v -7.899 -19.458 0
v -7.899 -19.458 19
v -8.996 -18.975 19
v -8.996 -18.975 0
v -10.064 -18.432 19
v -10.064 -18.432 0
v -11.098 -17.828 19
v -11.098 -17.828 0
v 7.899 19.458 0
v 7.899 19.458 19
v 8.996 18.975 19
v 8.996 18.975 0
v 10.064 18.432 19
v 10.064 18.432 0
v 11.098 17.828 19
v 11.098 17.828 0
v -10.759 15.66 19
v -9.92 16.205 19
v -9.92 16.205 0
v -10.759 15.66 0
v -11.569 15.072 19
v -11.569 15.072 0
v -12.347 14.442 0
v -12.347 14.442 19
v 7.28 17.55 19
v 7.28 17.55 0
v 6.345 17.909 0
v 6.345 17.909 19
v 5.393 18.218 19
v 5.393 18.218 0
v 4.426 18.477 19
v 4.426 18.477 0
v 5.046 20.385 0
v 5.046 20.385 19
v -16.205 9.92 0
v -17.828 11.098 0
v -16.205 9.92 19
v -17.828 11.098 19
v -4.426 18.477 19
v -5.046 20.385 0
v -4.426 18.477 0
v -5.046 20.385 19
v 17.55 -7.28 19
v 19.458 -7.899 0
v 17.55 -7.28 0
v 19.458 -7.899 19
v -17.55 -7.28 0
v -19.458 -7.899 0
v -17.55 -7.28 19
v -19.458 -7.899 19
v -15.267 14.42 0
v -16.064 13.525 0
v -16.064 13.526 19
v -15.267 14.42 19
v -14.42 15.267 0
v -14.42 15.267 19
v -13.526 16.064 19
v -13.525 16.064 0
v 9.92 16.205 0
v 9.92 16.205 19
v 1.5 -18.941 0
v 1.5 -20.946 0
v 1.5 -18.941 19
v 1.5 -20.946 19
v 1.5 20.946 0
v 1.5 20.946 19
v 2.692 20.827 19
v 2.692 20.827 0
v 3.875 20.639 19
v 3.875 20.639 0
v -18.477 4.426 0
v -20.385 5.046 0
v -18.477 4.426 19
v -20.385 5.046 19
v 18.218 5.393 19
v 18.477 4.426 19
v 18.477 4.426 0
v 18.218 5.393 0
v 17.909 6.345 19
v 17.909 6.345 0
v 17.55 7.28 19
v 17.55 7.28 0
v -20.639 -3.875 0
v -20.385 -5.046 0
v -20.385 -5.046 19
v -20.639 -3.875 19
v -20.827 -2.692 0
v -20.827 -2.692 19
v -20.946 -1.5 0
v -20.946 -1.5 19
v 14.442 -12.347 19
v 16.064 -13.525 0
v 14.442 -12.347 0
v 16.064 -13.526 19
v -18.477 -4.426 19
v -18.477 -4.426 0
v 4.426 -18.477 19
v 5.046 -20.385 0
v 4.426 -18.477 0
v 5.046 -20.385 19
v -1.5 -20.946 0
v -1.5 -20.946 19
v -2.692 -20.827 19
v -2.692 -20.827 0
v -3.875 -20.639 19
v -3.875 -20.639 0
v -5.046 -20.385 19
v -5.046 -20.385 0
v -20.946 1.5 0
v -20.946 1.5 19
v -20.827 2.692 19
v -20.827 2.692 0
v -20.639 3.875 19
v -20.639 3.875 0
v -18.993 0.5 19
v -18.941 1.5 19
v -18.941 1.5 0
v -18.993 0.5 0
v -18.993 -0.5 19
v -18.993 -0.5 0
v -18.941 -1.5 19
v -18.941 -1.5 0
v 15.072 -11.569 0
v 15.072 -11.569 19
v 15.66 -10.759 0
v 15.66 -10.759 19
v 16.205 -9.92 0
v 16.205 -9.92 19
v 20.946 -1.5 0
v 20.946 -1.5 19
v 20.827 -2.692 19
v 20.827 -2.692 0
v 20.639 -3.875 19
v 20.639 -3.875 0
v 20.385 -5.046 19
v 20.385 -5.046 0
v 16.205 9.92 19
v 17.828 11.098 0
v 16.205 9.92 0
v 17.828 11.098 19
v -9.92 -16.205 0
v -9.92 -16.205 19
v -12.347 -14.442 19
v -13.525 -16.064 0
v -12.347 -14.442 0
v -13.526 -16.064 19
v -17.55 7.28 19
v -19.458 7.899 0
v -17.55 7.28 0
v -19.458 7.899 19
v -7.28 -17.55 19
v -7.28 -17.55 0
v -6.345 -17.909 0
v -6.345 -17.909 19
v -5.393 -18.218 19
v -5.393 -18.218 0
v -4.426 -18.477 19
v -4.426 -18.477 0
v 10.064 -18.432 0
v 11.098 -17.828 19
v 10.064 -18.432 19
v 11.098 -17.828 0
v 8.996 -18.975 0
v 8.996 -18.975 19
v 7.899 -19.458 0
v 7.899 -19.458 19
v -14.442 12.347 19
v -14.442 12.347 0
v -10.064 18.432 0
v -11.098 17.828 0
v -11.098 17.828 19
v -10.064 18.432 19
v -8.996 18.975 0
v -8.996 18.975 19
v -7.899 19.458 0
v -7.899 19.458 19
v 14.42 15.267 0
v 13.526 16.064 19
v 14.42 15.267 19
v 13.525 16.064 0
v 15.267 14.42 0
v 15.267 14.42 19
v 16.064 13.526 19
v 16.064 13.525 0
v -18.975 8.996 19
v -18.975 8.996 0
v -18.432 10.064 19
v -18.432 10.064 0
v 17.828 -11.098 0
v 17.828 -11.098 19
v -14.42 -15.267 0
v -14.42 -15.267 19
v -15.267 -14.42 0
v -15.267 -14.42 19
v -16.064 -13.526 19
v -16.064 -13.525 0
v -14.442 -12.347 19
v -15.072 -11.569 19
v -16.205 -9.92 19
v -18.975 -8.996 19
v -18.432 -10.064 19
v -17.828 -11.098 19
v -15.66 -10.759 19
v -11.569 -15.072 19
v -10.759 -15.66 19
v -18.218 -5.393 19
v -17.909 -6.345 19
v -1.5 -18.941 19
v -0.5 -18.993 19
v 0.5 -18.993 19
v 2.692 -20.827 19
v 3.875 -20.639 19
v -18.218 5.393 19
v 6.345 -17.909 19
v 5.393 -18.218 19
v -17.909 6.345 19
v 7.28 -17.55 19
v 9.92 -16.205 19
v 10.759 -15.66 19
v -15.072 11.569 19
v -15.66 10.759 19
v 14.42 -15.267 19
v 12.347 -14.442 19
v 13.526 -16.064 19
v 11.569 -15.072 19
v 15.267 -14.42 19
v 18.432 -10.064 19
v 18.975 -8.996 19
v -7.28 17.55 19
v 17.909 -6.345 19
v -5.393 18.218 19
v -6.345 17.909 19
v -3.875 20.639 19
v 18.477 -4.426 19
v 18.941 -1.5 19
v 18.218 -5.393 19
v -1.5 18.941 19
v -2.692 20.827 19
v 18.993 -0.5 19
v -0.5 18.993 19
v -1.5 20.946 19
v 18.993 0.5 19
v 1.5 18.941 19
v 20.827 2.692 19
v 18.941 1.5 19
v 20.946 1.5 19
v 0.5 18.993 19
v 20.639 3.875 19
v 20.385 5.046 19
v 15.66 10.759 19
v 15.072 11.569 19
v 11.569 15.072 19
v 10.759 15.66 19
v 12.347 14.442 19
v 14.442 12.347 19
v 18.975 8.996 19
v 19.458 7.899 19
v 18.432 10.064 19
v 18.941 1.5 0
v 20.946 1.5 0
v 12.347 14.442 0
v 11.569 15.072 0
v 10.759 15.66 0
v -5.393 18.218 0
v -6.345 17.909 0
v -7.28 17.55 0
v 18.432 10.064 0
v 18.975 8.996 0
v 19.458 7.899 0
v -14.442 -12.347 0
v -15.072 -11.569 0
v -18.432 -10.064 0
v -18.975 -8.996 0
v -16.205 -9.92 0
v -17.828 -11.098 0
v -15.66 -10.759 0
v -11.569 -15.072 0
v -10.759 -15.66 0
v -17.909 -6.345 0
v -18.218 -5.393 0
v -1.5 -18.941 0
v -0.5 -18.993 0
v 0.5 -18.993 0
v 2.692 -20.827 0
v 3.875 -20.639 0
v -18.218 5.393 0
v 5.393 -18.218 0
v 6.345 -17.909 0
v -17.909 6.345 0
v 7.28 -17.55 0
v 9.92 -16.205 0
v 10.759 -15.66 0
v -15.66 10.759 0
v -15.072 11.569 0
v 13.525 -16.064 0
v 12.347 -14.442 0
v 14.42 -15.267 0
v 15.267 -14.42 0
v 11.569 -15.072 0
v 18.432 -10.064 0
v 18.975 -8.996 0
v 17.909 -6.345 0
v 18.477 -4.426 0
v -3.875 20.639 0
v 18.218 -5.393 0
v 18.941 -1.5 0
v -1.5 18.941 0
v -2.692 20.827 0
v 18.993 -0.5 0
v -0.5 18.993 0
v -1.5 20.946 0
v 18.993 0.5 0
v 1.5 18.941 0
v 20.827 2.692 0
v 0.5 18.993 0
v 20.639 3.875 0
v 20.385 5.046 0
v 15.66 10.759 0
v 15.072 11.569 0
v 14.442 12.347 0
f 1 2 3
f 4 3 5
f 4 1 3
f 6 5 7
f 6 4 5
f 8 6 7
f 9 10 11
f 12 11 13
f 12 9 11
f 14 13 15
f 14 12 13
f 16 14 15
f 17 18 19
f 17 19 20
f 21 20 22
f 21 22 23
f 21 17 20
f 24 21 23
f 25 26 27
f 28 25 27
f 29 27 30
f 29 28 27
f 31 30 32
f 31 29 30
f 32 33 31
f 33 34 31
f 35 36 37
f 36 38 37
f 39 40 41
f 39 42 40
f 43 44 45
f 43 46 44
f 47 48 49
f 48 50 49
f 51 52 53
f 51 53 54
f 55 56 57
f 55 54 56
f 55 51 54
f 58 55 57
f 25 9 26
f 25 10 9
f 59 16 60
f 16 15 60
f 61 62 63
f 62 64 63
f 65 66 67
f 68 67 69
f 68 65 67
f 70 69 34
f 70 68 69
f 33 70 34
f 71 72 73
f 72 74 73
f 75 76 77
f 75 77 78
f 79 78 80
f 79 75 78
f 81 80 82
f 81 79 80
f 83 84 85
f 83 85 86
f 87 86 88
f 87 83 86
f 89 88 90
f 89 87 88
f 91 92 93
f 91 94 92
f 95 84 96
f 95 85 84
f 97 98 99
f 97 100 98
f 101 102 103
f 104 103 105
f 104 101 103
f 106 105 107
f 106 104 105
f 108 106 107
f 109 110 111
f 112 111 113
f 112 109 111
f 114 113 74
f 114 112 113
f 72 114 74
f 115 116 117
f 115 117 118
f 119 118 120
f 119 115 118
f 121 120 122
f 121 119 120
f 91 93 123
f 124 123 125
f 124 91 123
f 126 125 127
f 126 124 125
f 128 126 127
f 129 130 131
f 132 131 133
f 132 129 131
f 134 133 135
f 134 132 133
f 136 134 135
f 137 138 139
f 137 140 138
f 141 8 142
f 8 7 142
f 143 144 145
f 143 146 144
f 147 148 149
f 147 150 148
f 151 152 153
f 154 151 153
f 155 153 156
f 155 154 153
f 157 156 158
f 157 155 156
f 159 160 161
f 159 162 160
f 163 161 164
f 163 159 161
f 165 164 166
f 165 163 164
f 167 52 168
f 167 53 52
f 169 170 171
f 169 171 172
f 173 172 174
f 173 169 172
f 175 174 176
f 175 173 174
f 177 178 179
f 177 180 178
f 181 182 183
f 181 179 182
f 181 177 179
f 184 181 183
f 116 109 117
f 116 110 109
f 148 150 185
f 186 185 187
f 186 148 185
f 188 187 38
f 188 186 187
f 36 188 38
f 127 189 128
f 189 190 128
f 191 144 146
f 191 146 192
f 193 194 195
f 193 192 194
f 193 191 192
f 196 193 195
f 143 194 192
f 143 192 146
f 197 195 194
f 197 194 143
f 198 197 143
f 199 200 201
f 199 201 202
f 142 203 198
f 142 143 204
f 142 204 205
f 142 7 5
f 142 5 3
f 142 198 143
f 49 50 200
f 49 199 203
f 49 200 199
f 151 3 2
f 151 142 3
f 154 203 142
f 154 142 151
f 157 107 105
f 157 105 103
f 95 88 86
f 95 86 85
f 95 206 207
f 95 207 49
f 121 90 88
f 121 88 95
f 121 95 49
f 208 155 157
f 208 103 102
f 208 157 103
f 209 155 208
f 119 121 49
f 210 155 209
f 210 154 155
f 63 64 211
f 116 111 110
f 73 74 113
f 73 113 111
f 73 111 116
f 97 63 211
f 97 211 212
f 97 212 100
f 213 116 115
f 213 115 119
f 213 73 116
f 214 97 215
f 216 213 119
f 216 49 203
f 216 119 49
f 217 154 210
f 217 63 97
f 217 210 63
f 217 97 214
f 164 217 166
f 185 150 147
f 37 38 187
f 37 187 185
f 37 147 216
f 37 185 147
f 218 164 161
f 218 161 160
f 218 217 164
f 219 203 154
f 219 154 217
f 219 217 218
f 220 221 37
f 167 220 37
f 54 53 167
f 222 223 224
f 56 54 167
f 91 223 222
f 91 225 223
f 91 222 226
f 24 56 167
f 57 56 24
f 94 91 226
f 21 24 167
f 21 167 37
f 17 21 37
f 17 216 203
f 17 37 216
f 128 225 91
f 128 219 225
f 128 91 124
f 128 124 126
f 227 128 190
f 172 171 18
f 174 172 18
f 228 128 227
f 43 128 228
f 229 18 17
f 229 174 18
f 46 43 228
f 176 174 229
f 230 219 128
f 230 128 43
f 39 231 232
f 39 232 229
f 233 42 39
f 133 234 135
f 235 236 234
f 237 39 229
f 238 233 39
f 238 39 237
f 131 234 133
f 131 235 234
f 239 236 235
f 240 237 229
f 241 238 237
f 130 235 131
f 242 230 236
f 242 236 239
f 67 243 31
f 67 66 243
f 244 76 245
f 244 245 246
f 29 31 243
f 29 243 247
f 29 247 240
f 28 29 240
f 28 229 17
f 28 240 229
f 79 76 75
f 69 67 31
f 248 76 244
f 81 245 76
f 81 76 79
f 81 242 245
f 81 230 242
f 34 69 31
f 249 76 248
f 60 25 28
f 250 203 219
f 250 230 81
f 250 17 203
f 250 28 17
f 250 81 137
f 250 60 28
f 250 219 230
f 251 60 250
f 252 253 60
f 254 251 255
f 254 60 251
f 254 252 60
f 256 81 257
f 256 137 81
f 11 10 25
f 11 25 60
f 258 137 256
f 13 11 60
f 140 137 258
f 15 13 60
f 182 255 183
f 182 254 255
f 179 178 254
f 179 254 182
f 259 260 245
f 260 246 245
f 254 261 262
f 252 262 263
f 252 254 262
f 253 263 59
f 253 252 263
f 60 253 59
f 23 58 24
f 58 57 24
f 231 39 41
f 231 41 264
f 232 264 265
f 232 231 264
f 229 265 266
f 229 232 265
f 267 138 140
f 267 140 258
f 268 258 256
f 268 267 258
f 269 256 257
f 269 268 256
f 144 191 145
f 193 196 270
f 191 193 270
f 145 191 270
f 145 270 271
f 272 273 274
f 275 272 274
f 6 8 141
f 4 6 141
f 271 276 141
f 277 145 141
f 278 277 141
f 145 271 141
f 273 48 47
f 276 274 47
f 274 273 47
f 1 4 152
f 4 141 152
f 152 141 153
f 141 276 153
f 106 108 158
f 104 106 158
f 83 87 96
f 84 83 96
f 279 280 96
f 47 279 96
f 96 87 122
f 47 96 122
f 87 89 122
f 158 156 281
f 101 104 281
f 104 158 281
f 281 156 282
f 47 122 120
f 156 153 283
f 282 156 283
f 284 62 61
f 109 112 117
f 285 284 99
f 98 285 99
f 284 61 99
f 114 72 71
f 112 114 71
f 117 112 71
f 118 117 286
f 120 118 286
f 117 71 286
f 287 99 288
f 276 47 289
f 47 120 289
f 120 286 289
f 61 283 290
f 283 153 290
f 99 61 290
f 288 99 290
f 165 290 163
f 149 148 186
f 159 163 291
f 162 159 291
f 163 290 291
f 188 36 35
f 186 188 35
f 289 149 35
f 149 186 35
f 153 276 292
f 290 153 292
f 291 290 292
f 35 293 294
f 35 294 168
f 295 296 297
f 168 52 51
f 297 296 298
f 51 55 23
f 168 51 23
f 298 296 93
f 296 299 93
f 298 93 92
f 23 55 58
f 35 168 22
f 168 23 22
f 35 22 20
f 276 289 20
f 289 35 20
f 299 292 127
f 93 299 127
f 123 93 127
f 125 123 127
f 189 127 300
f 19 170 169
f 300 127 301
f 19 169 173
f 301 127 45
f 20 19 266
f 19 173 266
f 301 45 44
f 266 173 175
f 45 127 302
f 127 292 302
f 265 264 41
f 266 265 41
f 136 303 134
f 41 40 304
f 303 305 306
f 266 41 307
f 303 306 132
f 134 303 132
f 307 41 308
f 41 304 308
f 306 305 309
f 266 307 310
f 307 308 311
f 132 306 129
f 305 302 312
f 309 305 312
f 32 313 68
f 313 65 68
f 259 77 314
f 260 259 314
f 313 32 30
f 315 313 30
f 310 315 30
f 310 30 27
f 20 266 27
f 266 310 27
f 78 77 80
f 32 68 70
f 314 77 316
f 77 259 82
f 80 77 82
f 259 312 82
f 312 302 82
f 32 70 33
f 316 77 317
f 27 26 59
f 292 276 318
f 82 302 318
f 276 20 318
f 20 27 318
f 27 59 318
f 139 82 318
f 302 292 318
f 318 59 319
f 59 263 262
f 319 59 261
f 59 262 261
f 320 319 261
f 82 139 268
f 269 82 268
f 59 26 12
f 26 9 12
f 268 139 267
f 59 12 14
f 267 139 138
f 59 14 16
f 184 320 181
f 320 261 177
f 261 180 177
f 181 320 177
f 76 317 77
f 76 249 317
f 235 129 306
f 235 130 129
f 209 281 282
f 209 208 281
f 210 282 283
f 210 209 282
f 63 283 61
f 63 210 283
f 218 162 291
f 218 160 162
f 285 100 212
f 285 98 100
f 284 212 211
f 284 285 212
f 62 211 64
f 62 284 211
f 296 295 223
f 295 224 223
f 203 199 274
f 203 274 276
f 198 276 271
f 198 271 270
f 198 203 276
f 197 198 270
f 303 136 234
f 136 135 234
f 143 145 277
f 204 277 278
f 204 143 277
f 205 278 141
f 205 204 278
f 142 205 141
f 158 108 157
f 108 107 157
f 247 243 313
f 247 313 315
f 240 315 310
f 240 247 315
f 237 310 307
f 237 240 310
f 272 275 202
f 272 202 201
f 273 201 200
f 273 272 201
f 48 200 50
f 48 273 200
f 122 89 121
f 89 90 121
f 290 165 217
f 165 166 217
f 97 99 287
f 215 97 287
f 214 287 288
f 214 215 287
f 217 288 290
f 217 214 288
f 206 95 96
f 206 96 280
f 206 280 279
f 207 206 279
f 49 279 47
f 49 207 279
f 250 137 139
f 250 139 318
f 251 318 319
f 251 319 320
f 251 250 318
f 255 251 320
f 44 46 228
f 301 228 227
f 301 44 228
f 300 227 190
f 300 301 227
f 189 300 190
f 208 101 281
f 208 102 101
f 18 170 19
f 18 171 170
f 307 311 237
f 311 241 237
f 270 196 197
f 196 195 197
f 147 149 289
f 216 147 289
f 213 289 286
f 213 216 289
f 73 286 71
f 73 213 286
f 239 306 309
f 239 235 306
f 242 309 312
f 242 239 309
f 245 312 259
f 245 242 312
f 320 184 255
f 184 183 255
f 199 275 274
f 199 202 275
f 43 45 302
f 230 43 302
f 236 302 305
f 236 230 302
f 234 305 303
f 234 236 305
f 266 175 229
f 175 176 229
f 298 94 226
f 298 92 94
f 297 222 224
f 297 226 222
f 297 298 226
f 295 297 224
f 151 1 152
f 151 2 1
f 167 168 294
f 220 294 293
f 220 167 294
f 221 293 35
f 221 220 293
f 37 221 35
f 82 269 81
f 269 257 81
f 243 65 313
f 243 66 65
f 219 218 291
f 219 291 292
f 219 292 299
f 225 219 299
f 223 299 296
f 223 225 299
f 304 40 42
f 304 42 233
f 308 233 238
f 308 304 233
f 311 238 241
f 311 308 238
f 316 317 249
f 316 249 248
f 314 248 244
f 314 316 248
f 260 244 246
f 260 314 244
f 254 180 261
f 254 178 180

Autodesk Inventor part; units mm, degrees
ref_plane "YZ Plane" through (0, 0, 0) normal (1, 0, 0) x (0, 1, 0)
ref_plane "XZ Plane" through (0, 0, 0) normal (0, 1, 0) x (-1, 0, 0)
ref_plane "XY Plane" through (0, 0, 0) normal (0, 0, 1) x (1, 0, 0)
sketch "Boceto1" plane through (0, 0, 0) normal (0, 0, 1) x (1, 0, 0)
  circle A0 centre (0, 0) radius 21
  dimension "d0" = 42
extrude "Extrusión1" add sketch "Boceto1" along normal blind 19
sketch "Boceto2" plane through (0, 0, 19) normal (0, 0, 1) x (1, 0, 0)
  circle A0 centre (0, 0) radius 21 construction
  circle A1 centre (0, 0) radius 21 projected
  circle A2 centre (0, 0) radius 19 construction
  arc A3 (1.5, 20.9464) -> (-1.5, 20.9464) centre (0, 0) ccw
  line L0 (1.5, 20.9464) -> (1.5, 18.9407)
  line L1 (-1.5, 20.9464) -> (-1.5, 18.9407)
  arc A4 (1.5, 18.9407) -> (-1.5, 18.9407) centre (0, 0) ccw
  arc A5 (7.8994, 19.4576) -> (5.0462, 20.3847) centre (0, 0) ccw
  line L2 (7.8994, 19.4576) -> (7.2796, 17.5501)
  line L3 (5.0462, 20.3847) -> (4.4264, 18.4772)
  arc A6 (7.2796, 17.5501) -> (4.4264, 18.4772) centre (0, 0) ccw
  arc A7 (13.5255, 16.0643) -> (11.0984, 17.8276) centre (0, 0) ccw
  line L4 (13.5255, 16.0643) -> (12.3466, 14.4417)
  line L5 (11.0984, 17.8276) -> (9.9195, 16.205)
  arc A8 (12.3466, 14.4417) -> (9.9195, 16.205) centre (0, 0) ccw
  arc A9 (17.8276, 11.0984) -> (16.0643, 13.5255) centre (0, 0) ccw
  line L6 (17.8276, 11.0984) -> (16.205, 9.9195)
  line L7 (16.0643, 13.5255) -> (14.4417, 12.3466)
  arc A10 (16.205, 9.9195) -> (14.4417, 12.3466) centre (0, 0) ccw
  arc A11 (20.3847, 5.0462) -> (19.4576, 7.8994) centre (0, 0) ccw
  line L8 (20.3847, 5.0462) -> (18.4772, 4.4264)
  line L9 (19.4576, 7.8994) -> (17.5501, 7.2796)
  arc A12 (18.4772, 4.4264) -> (17.5501, 7.2796) centre (0, 0) ccw
  arc A13 (20.9464, -1.5) -> (20.9464, 1.5) centre (0, 0) ccw
  line L10 (20.9464, -1.5) -> (18.9407, -1.5)
  line L11 (20.9464, 1.5) -> (18.9407, 1.5)
  arc A14 (18.9407, -1.5) -> (18.9407, 1.5) centre (0, 0) ccw
  arc A15 (19.4576, -7.8994) -> (20.3847, -5.0462) centre (0, 0) ccw
  line L12 (19.4576, -7.8994) -> (17.5501, -7.2796)
  line L13 (20.3847, -5.0462) -> (18.4772, -4.4264)
  arc A16 (17.5501, -7.2796) -> (18.4772, -4.4264) centre (0, 0) ccw
  arc A17 (16.0643, -13.5255) -> (17.8276, -11.0984) centre (0, 0) ccw
  line L14 (16.0643, -13.5255) -> (14.4417, -12.3466)
  line L15 (17.8276, -11.0984) -> (16.205, -9.9195)
  arc A18 (14.4417, -12.3466) -> (16.205, -9.9195) centre (0, 0) ccw
  arc A19 (11.0984, -17.8276) -> (13.5255, -16.0643) centre (0, 0) ccw
  line L16 (11.0984, -17.8276) -> (9.9195, -16.205)
  line L17 (13.5255, -16.0643) -> (12.3466, -14.4417)
  arc A20 (9.9195, -16.205) -> (12.3466, -14.4417) centre (0, 0) ccw
  arc A21 (5.0462, -20.3847) -> (7.8994, -19.4576) centre (0, 0) ccw
  line L18 (5.0462, -20.3847) -> (4.4264, -18.4772)
  line L19 (7.8994, -19.4576) -> (7.2796, -17.5501)
  arc A22 (4.4264, -18.4772) -> (7.2796, -17.5501) centre (0, 0) ccw
  arc A23 (-1.5, -20.9464) -> (1.5, -20.9464) centre (0, 0) ccw
  line L20 (-1.5, -20.9464) -> (-1.5, -18.9407)
  line L21 (1.5, -20.9464) -> (1.5, -18.9407)
  arc A24 (-1.5, -18.9407) -> (1.5, -18.9407) centre (0, 0) ccw
  arc A25 (-7.8994, -19.4576) -> (-5.0462, -20.3847) centre (0, 0) ccw
  line L22 (-7.8994, -19.4576) -> (-7.2796, -17.5501)
  line L23 (-5.0462, -20.3847) -> (-4.4264, -18.4772)
  arc A26 (-7.2796, -17.5501) -> (-4.4264, -18.4772) centre (0, 0) ccw
  arc A27 (-13.5255, -16.0643) -> (-11.0984, -17.8276) centre (0, 0) ccw
  line L24 (-13.5255, -16.0643) -> (-12.3466, -14.4417)
  line L25 (-11.0984, -17.8276) -> (-9.9195, -16.205)
  arc A28 (-12.3466, -14.4417) -> (-9.9195, -16.205) centre (0, 0) ccw
  arc A29 (-17.8276, -11.0984) -> (-16.0643, -13.5255) centre (0, 0) ccw
  line L26 (-17.8276, -11.0984) -> (-16.205, -9.9195)
  line L27 (-16.0643, -13.5255) -> (-14.4417, -12.3466)
  arc A30 (-16.205, -9.9195) -> (-14.4417, -12.3466) centre (0, 0) ccw
  arc A31 (-20.3847, -5.0462) -> (-19.4576, -7.8994) centre (0, 0) ccw
  line L28 (-20.3847, -5.0462) -> (-18.4772, -4.4264)
  line L29 (-19.4576, -7.8994) -> (-17.5501, -7.2796)
  arc A32 (-18.4772, -4.4264) -> (-17.5501, -7.2796) centre (0, 0) ccw
  arc A33 (-20.9464, 1.5) -> (-20.9464, -1.5) centre (0, 0) ccw
  line L30 (-20.9464, 1.5) -> (-18.9407, 1.5)
  line L31 (-20.9464, -1.5) -> (-18.9407, -1.5)
  arc A34 (-18.9407, 1.5) -> (-18.9407, -1.5) centre (0, 0) ccw
  arc A35 (-19.4576, 7.8994) -> (-20.3847, 5.0462) centre (0, 0) ccw
  line L32 (-19.4576, 7.8994) -> (-17.5501, 7.2796)
  line L33 (-20.3847, 5.0462) -> (-18.4772, 4.4264)
  arc A36 (-17.5501, 7.2796) -> (-18.4772, 4.4264) centre (0, 0) ccw
  arc A37 (-16.0643, 13.5255) -> (-17.8276, 11.0984) centre (0, 0) ccw
  line L34 (-16.0643, 13.5255) -> (-14.4417, 12.3466)
  line L35 (-17.8276, 11.0984) -> (-16.205, 9.9195)
  arc A38 (-14.4417, 12.3466) -> (-16.205, 9.9195) centre (0, 0) ccw
  arc A39 (-11.0984, 17.8276) -> (-13.5255, 16.0643) centre (0, 0) ccw
  line L36 (-11.0984, 17.8276) -> (-9.9195, 16.205)
  line L37 (-13.5255, 16.0643) -> (-12.3466, 14.4417)
  arc A40 (-9.9195, 16.205) -> (-12.3466, 14.4417) centre (0, 0) ccw
  arc A41 (-5.0462, 20.3847) -> (-7.8994, 19.4576) centre (0, 0) ccw
  line L38 (-5.0462, 20.3847) -> (-4.4264, 18.4772)
  line L39 (-7.8994, 19.4576) -> (-7.2796, 17.5501)
  arc A42 (-4.4264, 18.4772) -> (-7.2796, 17.5501) centre (0, 0) ccw
  point P0 (0, 21)
  point P1 (6.4894, 19.9722)
  point P2 (12.3435, 16.9894)
  point P3 (16.9894, 12.3435)
  point P4 (19.9722, 6.4894)
  point P5 (21, 0)
  point P6 (19.9722, -6.4894)
  point P7 (16.9894, -12.3435)
  point P8 (12.3435, -16.9894)
  point P9 (6.4894, -19.9722)
  point P10 (0, -21)
  point P11 (-6.4894, -19.9722)
  point P12 (-12.3435, -16.9894)
  point P13 (-16.9894, -12.3435)
  point P14 (-19.9722, -6.4894)
  point P15 (-21, 0)
  point P16 (-19.9722, 6.4894)
  point P17 (-16.9894, 12.3435)
  point P18 (-12.3435, 16.9894)
  point P19 (-6.4894, 19.9722)
  dimension "d3" = 38
  dimension "d4" = 3
  dimension "d7" = 360
extrude "Extrusión2" cut sketch "Boceto2" against normal through all contours A1 L10 A14 L11 | L8 A12 L9 A1 | A1 L12 A16 L13 | L6 A10 L7 A1 | A1 L14 A18 L15 | L4 A8 L5 A1 | A1 L16 A20 L17 | L2 A6 L3 A1 | A1 L18 A22 L19 | L0 A4 L1 A1 | A1 L20 A24 L21 | L38 A42 L39 A1 | A1 L22 A26 L23 | L36 A40 L37 A1 | A1 L24 A28 L25 | L34 A38 L35 A1 | A1 L26 A30 L27 | L32 A36 L33 A1 | A1 L28 A32 L29 | L30 A34 L31 A1
properties part number "Llanta" material "Goma"
